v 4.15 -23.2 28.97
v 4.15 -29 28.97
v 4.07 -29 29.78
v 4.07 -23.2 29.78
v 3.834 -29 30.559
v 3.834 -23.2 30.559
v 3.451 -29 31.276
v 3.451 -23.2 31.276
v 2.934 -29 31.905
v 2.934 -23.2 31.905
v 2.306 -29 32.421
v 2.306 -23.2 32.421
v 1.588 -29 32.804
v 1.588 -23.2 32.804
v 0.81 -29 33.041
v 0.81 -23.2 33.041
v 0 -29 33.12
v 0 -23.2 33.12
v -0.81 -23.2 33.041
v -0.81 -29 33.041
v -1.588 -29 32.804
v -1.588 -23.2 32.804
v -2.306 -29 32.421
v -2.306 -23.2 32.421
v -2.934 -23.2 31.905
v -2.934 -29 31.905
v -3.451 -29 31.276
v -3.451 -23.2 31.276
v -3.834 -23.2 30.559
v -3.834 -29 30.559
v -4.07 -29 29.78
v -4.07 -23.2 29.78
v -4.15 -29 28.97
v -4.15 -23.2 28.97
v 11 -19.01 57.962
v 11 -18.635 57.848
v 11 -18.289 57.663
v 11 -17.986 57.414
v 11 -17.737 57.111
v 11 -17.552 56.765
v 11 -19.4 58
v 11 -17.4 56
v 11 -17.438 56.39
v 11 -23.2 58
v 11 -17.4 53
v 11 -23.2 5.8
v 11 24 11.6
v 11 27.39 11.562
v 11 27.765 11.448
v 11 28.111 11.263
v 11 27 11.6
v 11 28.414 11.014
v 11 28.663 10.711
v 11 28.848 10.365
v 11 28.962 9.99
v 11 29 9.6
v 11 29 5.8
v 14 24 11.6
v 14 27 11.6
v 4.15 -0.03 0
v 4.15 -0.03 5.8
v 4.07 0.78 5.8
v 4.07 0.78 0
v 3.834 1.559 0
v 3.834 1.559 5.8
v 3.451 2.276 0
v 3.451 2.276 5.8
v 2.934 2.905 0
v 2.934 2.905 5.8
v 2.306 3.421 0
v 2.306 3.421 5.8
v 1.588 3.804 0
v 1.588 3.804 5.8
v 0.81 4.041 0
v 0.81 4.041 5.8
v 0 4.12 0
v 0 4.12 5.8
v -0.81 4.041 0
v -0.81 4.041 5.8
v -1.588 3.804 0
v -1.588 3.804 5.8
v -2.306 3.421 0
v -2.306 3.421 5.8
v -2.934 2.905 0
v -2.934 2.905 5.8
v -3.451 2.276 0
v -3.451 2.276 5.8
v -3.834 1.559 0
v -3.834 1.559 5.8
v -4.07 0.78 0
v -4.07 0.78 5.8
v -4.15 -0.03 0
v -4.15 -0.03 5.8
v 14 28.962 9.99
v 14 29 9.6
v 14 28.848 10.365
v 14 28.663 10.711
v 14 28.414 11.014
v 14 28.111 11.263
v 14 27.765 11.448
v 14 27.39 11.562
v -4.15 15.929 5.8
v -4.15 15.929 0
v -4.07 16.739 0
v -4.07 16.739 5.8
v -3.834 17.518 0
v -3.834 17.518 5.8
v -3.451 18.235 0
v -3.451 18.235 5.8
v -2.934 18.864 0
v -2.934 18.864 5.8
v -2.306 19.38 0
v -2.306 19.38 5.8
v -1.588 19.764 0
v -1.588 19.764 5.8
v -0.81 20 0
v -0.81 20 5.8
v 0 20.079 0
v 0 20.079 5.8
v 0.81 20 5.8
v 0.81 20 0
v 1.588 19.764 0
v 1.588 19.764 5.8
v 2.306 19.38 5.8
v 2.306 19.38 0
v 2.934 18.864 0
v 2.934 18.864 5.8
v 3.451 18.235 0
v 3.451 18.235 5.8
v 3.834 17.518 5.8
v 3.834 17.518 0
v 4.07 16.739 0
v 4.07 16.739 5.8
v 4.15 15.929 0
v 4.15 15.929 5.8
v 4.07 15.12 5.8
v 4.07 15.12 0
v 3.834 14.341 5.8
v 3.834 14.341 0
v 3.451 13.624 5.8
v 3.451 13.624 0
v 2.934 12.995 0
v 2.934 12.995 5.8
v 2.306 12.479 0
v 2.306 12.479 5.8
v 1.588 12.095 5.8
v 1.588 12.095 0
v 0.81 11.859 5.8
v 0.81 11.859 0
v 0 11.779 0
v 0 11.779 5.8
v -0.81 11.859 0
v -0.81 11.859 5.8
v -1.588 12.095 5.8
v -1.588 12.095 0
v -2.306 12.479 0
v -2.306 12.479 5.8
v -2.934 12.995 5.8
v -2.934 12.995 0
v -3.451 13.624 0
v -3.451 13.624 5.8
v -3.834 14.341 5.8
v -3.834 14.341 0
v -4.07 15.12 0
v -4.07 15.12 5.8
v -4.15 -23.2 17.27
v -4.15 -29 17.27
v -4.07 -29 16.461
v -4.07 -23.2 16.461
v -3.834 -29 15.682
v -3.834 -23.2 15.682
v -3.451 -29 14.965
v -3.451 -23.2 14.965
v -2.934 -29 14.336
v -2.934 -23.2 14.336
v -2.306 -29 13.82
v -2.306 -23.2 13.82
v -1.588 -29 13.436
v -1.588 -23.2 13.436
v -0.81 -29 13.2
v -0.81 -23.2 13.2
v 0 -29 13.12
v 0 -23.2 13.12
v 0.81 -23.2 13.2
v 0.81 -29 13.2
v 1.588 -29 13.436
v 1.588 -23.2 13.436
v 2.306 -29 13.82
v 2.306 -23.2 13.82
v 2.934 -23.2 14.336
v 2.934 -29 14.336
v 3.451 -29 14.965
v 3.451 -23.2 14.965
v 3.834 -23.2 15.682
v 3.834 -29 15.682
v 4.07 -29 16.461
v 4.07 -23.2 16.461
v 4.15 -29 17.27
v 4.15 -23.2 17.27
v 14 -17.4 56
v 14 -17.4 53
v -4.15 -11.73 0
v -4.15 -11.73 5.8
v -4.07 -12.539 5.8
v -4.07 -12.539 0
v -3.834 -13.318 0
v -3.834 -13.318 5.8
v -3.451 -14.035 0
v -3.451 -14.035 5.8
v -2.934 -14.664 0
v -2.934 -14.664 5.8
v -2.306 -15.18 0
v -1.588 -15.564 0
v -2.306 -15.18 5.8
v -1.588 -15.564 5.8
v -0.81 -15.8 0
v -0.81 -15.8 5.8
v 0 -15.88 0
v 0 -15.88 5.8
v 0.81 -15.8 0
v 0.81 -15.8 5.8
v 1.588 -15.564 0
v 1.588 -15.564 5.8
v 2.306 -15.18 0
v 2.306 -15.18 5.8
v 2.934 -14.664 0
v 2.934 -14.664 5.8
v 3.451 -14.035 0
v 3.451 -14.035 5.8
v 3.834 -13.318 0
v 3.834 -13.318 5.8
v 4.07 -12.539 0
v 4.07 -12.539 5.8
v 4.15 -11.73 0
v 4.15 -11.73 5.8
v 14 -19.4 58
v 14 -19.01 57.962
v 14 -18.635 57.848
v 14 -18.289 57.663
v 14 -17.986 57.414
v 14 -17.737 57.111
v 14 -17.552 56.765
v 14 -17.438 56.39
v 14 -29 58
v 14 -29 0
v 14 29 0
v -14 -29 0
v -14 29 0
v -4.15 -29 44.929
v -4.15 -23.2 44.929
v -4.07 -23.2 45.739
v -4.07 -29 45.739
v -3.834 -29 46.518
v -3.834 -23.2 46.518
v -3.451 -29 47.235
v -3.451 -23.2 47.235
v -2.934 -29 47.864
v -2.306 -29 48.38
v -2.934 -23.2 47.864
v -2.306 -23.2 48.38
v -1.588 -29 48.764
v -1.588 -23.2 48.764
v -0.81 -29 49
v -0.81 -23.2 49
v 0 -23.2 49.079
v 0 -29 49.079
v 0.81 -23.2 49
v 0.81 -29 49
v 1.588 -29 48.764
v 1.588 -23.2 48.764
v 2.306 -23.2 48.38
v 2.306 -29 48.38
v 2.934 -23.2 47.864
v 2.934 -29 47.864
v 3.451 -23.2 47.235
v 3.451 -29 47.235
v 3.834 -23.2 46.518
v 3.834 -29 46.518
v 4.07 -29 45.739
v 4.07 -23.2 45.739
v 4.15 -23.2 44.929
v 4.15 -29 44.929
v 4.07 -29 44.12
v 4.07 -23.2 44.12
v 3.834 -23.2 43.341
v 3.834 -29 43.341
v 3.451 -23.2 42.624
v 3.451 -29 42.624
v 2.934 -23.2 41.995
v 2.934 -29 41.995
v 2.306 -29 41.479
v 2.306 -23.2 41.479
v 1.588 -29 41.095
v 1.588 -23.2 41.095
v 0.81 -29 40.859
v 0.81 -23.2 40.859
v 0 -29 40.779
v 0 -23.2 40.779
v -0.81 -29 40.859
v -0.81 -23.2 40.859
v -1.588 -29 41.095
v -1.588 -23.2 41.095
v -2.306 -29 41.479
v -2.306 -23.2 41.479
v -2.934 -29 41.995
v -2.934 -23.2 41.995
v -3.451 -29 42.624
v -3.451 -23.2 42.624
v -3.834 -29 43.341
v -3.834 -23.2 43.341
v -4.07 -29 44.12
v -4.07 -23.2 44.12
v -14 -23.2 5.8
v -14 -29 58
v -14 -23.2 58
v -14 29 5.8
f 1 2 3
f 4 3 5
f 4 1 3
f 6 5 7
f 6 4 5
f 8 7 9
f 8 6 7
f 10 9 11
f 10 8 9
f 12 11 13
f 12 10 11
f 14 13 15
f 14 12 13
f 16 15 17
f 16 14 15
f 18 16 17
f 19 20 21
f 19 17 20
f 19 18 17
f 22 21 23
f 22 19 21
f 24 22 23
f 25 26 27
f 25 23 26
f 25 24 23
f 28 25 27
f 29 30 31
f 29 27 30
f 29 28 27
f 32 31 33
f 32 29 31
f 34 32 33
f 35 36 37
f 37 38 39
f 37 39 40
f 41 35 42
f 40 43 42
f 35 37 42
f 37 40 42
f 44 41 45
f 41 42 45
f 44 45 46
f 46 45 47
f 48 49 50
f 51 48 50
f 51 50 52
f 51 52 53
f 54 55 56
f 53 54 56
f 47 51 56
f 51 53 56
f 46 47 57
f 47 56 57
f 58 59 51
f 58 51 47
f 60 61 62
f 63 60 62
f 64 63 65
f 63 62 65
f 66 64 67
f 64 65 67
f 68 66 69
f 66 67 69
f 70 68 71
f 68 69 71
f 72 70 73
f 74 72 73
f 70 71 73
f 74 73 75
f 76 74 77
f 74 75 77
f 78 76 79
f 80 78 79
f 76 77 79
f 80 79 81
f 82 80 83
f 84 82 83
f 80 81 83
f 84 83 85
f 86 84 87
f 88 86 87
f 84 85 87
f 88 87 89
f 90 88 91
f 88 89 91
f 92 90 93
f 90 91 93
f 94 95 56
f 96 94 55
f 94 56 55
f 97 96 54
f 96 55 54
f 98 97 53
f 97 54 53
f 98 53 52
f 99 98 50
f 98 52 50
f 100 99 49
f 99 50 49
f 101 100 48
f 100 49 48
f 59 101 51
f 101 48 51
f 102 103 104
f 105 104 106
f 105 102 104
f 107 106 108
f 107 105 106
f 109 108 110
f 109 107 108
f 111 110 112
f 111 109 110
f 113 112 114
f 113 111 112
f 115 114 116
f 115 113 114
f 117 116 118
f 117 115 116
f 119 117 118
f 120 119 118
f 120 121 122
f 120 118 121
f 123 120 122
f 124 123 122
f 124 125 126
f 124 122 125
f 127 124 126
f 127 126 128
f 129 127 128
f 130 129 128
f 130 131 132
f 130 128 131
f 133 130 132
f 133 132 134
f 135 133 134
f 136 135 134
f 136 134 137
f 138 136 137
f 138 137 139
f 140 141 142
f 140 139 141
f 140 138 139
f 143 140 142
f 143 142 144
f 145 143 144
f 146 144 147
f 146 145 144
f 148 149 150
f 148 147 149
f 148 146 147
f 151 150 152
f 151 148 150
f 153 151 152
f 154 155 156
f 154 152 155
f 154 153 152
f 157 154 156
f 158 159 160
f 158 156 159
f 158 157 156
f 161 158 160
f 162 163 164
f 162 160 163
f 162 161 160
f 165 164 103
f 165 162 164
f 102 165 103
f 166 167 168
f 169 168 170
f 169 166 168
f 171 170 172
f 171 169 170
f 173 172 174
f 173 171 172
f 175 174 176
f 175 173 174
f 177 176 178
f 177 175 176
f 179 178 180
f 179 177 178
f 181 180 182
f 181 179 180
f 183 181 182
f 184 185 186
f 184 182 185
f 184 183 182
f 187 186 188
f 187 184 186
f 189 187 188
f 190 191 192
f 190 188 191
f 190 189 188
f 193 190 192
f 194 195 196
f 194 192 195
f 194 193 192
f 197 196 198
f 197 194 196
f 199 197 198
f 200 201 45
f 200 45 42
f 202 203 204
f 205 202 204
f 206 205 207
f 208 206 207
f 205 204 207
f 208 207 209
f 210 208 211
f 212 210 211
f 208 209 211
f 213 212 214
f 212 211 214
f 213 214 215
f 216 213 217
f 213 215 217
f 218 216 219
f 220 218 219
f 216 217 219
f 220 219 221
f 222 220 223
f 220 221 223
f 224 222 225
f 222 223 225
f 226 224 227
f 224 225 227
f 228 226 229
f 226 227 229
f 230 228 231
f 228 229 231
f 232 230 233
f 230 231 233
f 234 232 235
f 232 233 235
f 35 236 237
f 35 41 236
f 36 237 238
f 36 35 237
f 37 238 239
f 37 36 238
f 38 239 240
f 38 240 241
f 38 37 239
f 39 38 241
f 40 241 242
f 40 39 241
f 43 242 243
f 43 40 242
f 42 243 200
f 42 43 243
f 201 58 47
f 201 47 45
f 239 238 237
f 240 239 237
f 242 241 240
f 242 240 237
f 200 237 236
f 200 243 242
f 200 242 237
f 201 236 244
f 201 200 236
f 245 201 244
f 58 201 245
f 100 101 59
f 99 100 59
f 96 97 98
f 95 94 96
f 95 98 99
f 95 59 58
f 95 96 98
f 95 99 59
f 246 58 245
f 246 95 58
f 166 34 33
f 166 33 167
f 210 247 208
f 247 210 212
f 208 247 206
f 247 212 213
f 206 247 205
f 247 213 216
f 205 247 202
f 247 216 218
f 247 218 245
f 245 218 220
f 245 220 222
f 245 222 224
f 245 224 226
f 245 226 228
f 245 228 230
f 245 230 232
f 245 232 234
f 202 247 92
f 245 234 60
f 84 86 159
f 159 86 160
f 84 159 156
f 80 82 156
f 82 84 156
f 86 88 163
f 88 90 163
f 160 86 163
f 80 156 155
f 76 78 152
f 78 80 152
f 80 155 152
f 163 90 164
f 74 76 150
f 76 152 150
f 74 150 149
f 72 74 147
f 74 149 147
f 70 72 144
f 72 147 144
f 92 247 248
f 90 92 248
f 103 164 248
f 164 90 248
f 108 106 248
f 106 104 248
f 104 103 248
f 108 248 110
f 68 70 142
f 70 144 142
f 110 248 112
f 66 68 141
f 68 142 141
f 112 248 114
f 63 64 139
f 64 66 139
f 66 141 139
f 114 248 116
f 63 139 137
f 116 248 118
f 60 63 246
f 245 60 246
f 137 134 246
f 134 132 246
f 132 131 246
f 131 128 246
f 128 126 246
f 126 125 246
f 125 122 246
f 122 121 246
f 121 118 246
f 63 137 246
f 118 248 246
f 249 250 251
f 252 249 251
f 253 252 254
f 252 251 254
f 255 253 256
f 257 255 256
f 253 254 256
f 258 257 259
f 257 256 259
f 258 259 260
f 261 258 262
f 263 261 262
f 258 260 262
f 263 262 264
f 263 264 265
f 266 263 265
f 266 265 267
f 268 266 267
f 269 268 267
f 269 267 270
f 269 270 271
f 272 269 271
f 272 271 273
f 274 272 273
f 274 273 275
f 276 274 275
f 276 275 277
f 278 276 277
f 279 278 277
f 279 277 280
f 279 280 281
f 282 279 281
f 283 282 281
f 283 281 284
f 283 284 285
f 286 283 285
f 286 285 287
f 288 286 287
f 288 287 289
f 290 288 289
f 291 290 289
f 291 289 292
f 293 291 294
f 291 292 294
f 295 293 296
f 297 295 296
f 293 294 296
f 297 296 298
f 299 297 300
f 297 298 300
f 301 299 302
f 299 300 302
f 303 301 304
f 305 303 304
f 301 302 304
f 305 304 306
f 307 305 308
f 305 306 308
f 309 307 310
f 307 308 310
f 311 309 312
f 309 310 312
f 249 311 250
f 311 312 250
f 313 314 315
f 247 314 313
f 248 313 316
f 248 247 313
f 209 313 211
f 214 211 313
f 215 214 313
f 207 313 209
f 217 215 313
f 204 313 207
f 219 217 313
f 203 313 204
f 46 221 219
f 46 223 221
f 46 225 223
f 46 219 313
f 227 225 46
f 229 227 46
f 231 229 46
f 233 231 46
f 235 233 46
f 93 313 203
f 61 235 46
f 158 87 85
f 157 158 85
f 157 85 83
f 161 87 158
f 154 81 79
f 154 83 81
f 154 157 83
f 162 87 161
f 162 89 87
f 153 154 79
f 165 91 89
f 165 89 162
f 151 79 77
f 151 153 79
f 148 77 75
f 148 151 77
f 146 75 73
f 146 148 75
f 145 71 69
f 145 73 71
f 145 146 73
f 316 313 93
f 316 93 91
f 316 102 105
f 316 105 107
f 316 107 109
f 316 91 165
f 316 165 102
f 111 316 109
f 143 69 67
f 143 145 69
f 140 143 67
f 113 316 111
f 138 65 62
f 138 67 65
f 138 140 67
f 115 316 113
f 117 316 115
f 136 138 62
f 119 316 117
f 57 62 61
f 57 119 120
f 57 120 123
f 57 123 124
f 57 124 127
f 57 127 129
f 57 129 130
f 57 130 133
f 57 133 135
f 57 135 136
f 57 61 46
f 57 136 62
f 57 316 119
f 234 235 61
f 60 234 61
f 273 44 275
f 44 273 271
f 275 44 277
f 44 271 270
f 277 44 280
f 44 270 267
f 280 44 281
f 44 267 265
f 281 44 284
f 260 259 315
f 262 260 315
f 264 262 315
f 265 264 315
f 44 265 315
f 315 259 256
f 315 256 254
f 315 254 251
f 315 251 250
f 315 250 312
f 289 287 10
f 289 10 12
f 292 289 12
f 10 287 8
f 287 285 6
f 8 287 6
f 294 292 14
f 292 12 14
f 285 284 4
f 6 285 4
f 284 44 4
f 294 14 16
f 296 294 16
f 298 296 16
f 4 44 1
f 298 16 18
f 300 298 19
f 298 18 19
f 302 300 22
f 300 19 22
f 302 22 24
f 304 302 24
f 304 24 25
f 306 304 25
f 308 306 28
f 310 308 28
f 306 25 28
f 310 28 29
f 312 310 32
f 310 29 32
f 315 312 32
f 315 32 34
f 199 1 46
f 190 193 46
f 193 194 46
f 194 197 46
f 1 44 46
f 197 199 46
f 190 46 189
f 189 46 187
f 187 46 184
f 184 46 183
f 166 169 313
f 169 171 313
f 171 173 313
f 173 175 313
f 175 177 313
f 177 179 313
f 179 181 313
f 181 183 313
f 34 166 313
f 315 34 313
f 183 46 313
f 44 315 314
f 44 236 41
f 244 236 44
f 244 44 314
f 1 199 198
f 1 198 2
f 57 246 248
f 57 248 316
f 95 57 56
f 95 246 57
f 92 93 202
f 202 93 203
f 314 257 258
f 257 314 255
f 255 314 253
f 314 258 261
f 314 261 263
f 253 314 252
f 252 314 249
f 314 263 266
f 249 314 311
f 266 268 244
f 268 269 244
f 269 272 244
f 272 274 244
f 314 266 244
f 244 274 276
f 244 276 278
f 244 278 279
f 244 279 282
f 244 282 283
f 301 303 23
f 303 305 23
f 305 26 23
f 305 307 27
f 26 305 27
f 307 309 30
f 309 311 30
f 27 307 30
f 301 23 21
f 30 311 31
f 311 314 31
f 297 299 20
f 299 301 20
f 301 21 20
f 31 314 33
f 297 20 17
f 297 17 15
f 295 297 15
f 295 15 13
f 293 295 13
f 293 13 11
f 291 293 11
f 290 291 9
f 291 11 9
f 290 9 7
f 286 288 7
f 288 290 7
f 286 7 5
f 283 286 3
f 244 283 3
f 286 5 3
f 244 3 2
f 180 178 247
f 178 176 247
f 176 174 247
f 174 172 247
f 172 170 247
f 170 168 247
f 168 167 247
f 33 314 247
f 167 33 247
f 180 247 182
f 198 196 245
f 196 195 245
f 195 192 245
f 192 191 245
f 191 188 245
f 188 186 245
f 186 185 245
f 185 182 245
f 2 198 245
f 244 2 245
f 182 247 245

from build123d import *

# Parameters (mm, degrees)
SKETCH_1_W          = 28
SKETCH_1_H          = 58
EXTRUDE_1_DEPTH     = 5.8
SKETCH_2_W          = 28
SKETCH_2_H          = 5.8
EXTRUDE_2_DEPTH     = 58
EXTRUDE_3_DEPTH     = 3
FILLET_1_R          = 2
SKETCH_4_R          = 4.15
CUT_EXTRUDE_1_DEPTH = 80.276982788


with BuildPart() as part:
    # 草图1 → 凸台-拉伸1 (new body)
    with BuildSketch(Plane.XY):
        Rectangle(SKETCH_1_W, SKETCH_1_H)
    extrude(amount=EXTRUDE_1_DEPTH)

    # 草图2 → 凸台-拉伸2 (add)
    with BuildSketch(Plane(origin=(0, 0, 0), x_dir=(-1, 0, 0), z_dir=(0, 0, -1))):
        with Locations((0, -26.1)):
            Rectangle(SKETCH_2_W, SKETCH_2_H)
    extrude(amount=-EXTRUDE_2_DEPTH)

    # 草图3 → 凸台-拉伸3 (add)
    with BuildSketch(Plane(origin=(14, 0, 0), x_dir=(0, 0, -1), z_dir=(1, 0, 0))):
        Polygon((-5.8, 29), (-11.6, 29), (-11.6, 24), (-53, -17.4), (-58, -17.4), (-58, -23.2), (-5.8, -23.2), align=None)
    extrude(amount=-EXTRUDE_3_DEPTH)

    # 圆角1
    fillet_1_edges = [part.edges().sort_by_distance(p)[0] for p in [
        (12.5, -17.4, 58),
        (12.5, 29, 11.6),
    ]]
    fillet(fillet_1_edges, radius=FILLET_1_R)

    # 草图4 → 切除-拉伸1 (cut, through all)
    with BuildSketch(Plane(origin=(0, -23.2, 0), x_dir=(1, 0, 0), z_dir=(0, 1, 0))):
        with Locations(Location((0, -44.929446332, 0), (0, 0, 180))):
            Circle(SKETCH_4_R)
        with BuildLine():
            Line((4.15, -17.270397055), (4.15, -28.970397055))
            ThreePointArc((4.15, -28.970397055), (0, -33.120397055), (-4.15, -28.970397055))
            Line((-4.15, -28.970397055), (-4.15, -17.270397055))
            ThreePointArc((-4.15, -17.270397055), (0, -13.120397055), (4.15, -17.270397055))
        make_face()
    cut_extrude_1 = extrude(amount=-CUT_EXTRUDE_1_DEPTH, mode=Mode.SUBTRACT)

    # 镜向1: 切除-拉伸1 across plane
    add(cut_extrude_1.mirror(Plane(origin=(0, -14.5, 14.5), x_dir=(0, 0.7071067811865469, 0.7071067811865482), z_dir=(0, -0.7071067811865483, 0.7071067811865468))), mode=Mode.SUBTRACT)


solid = part.part
